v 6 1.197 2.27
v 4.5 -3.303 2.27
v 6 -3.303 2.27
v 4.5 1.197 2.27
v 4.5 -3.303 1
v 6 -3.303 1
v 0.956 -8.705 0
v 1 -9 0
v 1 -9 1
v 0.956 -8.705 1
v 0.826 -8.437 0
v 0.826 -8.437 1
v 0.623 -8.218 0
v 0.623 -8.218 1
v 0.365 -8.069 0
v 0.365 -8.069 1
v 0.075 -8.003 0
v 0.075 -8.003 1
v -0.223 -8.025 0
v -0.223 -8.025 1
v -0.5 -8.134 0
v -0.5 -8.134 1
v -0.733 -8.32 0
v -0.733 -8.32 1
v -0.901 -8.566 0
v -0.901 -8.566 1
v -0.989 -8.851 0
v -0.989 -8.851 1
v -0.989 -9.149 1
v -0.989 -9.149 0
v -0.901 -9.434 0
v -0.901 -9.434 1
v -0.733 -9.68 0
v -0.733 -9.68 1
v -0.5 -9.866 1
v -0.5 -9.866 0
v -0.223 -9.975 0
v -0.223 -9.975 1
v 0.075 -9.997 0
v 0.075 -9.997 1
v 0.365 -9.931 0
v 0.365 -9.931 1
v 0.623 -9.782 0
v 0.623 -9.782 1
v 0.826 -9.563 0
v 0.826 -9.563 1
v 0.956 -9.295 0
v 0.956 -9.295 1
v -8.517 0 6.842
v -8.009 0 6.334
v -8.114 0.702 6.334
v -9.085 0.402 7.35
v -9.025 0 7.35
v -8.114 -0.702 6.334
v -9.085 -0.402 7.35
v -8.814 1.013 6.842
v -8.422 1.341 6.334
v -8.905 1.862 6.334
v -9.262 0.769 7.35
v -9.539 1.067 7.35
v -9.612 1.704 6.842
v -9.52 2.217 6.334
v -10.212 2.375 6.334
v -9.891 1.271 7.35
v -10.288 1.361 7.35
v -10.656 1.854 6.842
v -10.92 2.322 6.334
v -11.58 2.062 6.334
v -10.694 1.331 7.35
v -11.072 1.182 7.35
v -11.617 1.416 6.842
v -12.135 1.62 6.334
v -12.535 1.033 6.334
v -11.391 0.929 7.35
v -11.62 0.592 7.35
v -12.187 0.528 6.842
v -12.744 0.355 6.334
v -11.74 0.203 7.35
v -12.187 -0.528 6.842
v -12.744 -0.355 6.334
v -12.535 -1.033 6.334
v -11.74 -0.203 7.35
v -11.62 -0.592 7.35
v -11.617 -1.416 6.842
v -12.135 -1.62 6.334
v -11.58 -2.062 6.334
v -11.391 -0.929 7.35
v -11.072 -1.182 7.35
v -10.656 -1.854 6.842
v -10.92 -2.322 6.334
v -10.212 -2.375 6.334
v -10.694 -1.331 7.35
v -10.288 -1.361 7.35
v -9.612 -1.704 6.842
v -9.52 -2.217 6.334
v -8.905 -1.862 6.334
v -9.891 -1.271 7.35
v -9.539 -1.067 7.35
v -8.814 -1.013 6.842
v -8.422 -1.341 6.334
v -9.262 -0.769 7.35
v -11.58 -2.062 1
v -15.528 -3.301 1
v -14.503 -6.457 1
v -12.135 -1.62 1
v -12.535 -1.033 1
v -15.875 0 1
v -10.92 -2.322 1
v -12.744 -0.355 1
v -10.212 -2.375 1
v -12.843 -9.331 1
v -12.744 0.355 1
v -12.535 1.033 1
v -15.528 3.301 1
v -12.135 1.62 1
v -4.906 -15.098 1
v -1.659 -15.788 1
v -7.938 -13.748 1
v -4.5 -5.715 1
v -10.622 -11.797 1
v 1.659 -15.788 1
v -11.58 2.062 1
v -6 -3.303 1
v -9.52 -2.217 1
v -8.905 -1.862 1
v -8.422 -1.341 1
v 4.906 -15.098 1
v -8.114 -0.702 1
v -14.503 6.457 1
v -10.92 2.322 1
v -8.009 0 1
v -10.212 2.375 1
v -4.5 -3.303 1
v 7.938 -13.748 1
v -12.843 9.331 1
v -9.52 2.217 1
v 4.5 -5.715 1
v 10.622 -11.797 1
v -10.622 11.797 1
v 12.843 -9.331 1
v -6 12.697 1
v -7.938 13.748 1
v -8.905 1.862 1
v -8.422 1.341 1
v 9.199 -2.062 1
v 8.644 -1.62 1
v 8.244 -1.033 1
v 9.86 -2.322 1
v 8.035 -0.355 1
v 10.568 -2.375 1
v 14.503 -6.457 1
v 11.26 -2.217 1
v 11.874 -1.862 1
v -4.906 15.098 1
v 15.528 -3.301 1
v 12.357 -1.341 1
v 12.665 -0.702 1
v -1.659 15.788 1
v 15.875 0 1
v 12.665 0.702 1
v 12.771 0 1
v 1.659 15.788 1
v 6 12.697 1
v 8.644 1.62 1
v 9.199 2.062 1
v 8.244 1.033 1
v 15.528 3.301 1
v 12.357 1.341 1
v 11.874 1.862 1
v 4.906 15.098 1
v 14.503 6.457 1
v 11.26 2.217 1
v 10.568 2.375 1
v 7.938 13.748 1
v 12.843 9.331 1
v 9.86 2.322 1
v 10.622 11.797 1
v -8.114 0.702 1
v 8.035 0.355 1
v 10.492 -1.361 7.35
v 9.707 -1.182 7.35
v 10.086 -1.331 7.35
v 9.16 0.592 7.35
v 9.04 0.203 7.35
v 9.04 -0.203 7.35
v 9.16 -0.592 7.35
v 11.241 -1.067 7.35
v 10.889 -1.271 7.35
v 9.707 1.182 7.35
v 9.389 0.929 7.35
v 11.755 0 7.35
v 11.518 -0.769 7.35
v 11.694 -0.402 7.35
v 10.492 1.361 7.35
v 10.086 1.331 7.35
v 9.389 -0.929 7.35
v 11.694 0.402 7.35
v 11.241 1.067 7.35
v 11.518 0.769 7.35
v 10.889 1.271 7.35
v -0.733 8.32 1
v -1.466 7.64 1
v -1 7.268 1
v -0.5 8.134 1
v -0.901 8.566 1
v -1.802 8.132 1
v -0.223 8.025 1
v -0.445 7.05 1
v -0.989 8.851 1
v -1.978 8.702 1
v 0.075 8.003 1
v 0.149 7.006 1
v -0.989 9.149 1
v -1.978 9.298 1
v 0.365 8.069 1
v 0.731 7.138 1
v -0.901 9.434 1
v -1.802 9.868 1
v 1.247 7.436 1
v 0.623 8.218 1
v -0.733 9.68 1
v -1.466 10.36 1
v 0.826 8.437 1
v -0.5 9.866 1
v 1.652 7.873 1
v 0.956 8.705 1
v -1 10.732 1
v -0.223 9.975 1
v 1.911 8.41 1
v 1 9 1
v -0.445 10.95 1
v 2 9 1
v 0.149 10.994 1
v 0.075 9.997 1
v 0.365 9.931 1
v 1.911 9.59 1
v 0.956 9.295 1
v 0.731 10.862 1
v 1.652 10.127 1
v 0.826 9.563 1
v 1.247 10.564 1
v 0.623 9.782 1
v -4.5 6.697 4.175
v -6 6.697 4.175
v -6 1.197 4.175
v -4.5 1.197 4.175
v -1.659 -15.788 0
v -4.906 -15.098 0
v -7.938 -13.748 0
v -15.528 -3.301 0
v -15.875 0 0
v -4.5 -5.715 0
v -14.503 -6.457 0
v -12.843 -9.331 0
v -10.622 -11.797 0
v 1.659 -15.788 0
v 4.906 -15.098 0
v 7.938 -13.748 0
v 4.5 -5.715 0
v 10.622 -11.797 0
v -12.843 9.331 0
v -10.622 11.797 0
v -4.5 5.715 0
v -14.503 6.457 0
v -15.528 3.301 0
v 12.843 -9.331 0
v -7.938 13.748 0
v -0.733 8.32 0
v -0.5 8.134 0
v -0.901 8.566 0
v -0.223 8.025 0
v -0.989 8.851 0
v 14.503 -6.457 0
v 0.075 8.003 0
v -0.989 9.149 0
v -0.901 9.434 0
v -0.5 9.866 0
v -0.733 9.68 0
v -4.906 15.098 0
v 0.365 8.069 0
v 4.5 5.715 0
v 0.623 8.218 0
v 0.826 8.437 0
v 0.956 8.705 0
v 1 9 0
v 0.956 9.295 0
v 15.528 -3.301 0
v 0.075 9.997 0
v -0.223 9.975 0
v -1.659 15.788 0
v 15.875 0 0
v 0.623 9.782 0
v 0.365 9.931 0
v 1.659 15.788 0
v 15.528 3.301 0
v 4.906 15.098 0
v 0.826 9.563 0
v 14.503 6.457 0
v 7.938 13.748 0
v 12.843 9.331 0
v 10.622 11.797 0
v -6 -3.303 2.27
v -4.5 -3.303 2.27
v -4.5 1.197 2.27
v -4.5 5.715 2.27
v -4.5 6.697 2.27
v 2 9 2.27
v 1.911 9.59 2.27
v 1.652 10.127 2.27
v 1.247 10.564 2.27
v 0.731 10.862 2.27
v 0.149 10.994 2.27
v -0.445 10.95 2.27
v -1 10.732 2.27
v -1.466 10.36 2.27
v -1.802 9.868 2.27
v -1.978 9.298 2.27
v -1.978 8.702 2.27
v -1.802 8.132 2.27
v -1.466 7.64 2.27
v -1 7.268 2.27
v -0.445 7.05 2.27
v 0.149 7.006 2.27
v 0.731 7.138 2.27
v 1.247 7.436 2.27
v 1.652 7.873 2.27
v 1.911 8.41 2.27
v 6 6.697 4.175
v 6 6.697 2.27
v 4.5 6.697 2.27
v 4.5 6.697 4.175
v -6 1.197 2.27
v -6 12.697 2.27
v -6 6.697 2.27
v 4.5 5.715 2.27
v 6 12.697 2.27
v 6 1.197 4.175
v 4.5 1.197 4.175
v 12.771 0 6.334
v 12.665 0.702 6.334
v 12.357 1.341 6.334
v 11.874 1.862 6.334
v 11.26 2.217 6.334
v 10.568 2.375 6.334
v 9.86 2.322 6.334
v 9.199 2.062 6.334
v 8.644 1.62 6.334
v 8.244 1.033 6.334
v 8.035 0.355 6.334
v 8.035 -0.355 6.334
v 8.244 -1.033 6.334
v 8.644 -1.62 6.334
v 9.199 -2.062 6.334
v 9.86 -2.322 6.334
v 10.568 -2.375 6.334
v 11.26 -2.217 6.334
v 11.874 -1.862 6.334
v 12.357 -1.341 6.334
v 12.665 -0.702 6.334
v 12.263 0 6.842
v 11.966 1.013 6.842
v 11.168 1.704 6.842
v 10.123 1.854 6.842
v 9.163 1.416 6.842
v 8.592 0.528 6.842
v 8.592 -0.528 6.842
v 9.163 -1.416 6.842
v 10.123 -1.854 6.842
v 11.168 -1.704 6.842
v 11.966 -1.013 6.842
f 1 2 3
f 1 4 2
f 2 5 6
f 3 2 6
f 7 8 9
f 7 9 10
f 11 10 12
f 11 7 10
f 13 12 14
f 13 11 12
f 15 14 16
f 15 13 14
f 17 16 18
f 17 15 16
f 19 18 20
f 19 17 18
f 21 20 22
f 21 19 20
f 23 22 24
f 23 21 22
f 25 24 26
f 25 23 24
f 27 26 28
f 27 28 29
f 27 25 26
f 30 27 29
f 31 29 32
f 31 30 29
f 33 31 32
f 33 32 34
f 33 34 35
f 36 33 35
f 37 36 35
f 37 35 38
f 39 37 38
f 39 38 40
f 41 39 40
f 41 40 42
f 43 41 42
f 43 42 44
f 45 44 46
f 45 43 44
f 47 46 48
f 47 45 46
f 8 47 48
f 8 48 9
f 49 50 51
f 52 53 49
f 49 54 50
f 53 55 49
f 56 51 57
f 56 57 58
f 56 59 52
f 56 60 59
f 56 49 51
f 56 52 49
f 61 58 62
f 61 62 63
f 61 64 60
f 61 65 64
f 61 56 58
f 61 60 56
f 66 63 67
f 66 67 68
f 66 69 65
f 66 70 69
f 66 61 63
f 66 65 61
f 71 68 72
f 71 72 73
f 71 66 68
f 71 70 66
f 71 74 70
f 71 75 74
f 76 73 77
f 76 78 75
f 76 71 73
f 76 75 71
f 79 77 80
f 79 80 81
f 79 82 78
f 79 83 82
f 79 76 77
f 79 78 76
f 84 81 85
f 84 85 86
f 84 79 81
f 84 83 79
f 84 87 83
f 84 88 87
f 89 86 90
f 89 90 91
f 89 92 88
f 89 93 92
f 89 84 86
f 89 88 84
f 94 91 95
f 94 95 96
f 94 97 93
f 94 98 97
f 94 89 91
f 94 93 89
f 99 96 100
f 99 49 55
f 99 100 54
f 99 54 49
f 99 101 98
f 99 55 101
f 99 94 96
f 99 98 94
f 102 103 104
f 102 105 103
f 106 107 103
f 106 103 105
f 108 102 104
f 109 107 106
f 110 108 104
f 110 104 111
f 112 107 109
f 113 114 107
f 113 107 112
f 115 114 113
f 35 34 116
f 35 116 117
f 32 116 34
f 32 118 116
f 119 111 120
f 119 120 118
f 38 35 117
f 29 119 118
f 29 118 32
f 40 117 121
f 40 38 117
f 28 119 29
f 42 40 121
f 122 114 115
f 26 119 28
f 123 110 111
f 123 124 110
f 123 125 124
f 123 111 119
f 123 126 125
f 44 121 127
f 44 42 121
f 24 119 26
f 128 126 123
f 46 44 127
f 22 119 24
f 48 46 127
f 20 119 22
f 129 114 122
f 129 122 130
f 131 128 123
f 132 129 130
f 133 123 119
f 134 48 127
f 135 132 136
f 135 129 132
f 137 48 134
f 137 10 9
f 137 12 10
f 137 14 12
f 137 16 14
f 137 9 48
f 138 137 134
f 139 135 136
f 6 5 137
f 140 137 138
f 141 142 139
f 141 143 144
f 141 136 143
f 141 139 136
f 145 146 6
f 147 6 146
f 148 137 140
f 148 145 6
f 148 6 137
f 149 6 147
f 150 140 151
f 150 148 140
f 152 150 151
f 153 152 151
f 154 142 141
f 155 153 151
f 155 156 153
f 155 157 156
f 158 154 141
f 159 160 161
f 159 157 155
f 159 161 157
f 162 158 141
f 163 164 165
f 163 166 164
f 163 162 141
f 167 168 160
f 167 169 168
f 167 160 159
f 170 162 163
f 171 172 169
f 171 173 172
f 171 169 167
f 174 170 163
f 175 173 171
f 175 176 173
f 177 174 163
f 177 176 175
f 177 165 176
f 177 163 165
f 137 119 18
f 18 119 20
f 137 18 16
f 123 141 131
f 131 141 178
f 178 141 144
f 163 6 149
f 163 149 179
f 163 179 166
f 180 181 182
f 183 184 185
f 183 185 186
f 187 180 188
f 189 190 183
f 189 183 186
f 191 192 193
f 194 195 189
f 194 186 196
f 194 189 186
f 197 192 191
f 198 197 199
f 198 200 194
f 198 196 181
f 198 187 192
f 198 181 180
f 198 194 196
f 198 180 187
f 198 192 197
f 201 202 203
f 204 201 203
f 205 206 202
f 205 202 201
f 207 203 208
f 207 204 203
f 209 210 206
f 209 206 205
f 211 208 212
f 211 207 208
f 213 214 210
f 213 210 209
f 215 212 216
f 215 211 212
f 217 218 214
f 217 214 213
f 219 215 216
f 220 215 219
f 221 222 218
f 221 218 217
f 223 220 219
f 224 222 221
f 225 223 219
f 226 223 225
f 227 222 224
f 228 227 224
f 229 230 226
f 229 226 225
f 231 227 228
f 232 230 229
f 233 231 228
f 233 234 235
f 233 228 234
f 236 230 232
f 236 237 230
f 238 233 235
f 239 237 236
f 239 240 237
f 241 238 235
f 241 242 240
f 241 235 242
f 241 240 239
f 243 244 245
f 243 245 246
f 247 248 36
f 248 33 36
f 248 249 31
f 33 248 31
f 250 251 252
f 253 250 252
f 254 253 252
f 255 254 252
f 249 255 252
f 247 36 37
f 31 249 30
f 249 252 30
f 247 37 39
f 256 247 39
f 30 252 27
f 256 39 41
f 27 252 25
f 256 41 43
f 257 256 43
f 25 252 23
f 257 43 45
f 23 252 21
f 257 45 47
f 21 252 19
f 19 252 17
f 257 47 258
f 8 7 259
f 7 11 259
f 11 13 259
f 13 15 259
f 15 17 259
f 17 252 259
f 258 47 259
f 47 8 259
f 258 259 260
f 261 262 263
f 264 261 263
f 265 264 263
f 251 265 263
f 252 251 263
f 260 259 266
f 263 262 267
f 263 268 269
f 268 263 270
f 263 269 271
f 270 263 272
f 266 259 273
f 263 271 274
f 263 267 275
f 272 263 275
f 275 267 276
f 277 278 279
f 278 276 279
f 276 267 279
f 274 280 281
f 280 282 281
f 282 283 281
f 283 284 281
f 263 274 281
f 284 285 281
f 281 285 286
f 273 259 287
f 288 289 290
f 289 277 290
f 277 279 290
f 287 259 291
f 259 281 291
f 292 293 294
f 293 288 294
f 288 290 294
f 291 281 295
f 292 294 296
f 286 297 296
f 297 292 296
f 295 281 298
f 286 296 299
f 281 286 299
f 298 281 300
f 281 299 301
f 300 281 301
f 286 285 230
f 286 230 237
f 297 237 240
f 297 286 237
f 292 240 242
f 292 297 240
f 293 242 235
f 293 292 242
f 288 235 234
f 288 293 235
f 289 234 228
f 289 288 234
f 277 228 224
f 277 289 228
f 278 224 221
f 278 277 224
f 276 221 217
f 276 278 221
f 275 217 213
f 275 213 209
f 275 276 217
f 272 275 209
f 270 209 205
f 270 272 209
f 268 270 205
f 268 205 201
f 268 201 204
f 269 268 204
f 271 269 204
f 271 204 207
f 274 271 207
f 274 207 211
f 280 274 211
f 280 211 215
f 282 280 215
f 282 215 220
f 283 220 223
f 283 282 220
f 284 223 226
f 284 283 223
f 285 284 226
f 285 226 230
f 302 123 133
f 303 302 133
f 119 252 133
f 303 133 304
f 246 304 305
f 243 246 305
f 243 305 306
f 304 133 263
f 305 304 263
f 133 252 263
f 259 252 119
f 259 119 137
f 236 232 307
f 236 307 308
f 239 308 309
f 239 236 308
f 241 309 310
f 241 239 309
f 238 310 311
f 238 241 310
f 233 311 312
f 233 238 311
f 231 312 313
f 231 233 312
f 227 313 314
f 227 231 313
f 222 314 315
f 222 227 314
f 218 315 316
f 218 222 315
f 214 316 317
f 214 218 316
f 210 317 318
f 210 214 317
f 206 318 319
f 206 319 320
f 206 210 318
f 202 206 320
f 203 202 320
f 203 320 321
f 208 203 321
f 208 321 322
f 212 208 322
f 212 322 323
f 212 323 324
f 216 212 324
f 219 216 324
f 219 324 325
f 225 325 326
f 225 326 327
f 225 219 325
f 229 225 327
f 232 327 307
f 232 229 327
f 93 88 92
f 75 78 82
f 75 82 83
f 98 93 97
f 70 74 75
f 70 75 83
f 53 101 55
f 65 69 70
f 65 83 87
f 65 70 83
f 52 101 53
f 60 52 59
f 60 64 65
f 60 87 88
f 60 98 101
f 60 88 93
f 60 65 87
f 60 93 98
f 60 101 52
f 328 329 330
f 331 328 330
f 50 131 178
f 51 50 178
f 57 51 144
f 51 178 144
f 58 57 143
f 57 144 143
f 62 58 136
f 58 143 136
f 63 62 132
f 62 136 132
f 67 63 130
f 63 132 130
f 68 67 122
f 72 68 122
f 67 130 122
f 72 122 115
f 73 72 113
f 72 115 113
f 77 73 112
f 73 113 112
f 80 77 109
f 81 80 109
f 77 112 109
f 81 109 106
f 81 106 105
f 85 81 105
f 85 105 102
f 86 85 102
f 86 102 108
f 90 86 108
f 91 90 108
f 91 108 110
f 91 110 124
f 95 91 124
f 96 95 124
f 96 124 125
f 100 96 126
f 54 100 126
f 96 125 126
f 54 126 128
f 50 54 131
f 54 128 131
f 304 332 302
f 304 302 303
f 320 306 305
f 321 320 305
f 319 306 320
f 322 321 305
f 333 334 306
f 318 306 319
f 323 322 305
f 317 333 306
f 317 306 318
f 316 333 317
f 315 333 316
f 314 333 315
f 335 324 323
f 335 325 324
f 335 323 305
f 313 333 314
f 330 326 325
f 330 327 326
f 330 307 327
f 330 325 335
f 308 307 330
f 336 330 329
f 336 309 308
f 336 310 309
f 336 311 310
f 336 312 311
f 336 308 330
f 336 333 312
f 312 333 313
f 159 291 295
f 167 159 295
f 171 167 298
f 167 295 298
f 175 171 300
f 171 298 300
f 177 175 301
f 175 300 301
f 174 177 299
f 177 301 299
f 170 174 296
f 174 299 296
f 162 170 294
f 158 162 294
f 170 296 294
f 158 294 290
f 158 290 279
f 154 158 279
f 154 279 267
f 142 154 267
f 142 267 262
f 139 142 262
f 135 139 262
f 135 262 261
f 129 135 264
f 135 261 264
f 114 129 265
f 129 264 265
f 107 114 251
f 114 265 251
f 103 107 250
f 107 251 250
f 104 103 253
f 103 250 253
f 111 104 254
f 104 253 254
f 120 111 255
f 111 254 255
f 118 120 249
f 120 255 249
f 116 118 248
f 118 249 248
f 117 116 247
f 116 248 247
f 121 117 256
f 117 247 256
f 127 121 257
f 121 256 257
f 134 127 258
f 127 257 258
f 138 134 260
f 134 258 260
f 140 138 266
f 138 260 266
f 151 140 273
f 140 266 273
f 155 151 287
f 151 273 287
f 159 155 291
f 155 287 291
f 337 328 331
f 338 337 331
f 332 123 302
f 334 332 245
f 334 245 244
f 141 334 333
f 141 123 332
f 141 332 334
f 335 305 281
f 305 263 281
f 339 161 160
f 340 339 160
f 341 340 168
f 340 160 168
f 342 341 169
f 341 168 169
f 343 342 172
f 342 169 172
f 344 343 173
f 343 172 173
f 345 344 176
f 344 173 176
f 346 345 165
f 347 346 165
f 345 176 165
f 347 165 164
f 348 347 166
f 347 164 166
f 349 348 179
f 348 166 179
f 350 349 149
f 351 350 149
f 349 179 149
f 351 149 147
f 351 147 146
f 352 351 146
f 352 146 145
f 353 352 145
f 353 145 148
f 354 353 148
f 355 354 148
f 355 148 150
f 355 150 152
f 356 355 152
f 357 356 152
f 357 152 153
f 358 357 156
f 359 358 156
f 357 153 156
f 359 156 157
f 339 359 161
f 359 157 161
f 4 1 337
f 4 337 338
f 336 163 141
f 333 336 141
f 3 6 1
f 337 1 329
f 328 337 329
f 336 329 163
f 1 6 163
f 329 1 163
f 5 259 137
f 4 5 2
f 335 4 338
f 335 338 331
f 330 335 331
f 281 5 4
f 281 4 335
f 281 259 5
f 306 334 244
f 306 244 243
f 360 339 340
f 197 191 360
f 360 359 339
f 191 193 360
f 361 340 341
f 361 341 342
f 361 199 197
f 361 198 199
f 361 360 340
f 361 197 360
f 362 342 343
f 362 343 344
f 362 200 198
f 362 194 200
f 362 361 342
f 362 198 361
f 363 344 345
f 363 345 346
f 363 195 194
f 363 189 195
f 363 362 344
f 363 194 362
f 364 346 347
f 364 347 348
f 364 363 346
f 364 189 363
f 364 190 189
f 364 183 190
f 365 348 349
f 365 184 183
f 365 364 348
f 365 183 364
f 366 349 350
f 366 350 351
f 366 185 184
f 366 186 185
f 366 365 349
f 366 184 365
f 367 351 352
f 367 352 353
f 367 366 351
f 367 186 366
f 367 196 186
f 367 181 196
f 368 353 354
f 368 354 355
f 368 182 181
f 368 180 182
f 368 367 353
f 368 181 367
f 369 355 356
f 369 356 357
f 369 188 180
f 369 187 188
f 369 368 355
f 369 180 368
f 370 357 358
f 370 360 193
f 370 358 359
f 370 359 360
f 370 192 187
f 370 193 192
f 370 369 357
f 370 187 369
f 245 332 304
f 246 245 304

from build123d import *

# Parameters (mm, degrees)
F0_R     = 15.875
F0_R_2   = 1
F0_W     = 9
F0_H     = 11.43
F1_DEPTH = 1
F2_R     = 2
F3_DEPTH = 1.27
F4_W     = 1.5
F4_H     = 5.5
F5_DEPTH = 1.905
F6_R     = 2.38125
F7_DEPTH = 6.35
F8_SIZE  = 1.016


# Not quite as in the source:
# - a pattern or mirror of a feature is missing from the dataset's text; its kind, count and spacing are read off the source's solid


with BuildPart() as f1:
    # F0 (on Top) → F1 (new body)
    with BuildSketch(Plane.XY):
        Circle(F0_R)
        with Locations((0, -9)):
            Circle(F0_R_2, mode=Mode.SUBTRACT)
        Rectangle(F0_W, F0_H, mode=Mode.SUBTRACT)
        with Locations((0, 9)):
            Circle(F0_R_2, mode=Mode.SUBTRACT)
    extrude(amount=F1_DEPTH)

    # F2 (on face) → F3 (join)
    with BuildSketch(Plane.XY.offset(1)):
        Polygon((6, 12.6974700204), (-6, 12.6974700204), (-6, -3.3025299796), (-4.5, -3.3025299796), (-4.5, 5.715), (4.5, 5.715), (4.5, -3.3025299796), (6, -3.3025299796), align=None)
        with Locations((0, 9)):
            Circle(F2_R, mode=Mode.SUBTRACT)
    extrude(amount=F3_DEPTH)

    # F4 (on face) → F5 (join)
    with BuildSketch(Plane.XY.offset(2.27)):
        with Locations((-5.25, 3.9474700204)):
            Rectangle(F4_W, F4_H)
    f5 = extrude(amount=F5_DEPTH)

    # F5_copies: F5 across plane
    add(f5.mirror(Plane(origin=(0, 0, 0), x_dir=(0, 0, 1), z_dir=(1, 0, 0))))

    # F6 (on face) → F7 (join)
    with BuildSketch(Plane.XY.offset(1)):
        with Locations((10.3898039088, 0)):
            Circle(F6_R)
        with Locations((-10.3898039088, 0)):
            Circle(F6_R)
    extrude(amount=F7_DEPTH)

    # F8
    f8_edges = [f1.edges().sort_by_distance(p)[0] for p in [
        (-12.771054, 0, 7.35),
        (8.008554, 0, 7.35),
    ]]
    chamfer(f8_edges, length=F8_SIZE)


solid = f1.part
